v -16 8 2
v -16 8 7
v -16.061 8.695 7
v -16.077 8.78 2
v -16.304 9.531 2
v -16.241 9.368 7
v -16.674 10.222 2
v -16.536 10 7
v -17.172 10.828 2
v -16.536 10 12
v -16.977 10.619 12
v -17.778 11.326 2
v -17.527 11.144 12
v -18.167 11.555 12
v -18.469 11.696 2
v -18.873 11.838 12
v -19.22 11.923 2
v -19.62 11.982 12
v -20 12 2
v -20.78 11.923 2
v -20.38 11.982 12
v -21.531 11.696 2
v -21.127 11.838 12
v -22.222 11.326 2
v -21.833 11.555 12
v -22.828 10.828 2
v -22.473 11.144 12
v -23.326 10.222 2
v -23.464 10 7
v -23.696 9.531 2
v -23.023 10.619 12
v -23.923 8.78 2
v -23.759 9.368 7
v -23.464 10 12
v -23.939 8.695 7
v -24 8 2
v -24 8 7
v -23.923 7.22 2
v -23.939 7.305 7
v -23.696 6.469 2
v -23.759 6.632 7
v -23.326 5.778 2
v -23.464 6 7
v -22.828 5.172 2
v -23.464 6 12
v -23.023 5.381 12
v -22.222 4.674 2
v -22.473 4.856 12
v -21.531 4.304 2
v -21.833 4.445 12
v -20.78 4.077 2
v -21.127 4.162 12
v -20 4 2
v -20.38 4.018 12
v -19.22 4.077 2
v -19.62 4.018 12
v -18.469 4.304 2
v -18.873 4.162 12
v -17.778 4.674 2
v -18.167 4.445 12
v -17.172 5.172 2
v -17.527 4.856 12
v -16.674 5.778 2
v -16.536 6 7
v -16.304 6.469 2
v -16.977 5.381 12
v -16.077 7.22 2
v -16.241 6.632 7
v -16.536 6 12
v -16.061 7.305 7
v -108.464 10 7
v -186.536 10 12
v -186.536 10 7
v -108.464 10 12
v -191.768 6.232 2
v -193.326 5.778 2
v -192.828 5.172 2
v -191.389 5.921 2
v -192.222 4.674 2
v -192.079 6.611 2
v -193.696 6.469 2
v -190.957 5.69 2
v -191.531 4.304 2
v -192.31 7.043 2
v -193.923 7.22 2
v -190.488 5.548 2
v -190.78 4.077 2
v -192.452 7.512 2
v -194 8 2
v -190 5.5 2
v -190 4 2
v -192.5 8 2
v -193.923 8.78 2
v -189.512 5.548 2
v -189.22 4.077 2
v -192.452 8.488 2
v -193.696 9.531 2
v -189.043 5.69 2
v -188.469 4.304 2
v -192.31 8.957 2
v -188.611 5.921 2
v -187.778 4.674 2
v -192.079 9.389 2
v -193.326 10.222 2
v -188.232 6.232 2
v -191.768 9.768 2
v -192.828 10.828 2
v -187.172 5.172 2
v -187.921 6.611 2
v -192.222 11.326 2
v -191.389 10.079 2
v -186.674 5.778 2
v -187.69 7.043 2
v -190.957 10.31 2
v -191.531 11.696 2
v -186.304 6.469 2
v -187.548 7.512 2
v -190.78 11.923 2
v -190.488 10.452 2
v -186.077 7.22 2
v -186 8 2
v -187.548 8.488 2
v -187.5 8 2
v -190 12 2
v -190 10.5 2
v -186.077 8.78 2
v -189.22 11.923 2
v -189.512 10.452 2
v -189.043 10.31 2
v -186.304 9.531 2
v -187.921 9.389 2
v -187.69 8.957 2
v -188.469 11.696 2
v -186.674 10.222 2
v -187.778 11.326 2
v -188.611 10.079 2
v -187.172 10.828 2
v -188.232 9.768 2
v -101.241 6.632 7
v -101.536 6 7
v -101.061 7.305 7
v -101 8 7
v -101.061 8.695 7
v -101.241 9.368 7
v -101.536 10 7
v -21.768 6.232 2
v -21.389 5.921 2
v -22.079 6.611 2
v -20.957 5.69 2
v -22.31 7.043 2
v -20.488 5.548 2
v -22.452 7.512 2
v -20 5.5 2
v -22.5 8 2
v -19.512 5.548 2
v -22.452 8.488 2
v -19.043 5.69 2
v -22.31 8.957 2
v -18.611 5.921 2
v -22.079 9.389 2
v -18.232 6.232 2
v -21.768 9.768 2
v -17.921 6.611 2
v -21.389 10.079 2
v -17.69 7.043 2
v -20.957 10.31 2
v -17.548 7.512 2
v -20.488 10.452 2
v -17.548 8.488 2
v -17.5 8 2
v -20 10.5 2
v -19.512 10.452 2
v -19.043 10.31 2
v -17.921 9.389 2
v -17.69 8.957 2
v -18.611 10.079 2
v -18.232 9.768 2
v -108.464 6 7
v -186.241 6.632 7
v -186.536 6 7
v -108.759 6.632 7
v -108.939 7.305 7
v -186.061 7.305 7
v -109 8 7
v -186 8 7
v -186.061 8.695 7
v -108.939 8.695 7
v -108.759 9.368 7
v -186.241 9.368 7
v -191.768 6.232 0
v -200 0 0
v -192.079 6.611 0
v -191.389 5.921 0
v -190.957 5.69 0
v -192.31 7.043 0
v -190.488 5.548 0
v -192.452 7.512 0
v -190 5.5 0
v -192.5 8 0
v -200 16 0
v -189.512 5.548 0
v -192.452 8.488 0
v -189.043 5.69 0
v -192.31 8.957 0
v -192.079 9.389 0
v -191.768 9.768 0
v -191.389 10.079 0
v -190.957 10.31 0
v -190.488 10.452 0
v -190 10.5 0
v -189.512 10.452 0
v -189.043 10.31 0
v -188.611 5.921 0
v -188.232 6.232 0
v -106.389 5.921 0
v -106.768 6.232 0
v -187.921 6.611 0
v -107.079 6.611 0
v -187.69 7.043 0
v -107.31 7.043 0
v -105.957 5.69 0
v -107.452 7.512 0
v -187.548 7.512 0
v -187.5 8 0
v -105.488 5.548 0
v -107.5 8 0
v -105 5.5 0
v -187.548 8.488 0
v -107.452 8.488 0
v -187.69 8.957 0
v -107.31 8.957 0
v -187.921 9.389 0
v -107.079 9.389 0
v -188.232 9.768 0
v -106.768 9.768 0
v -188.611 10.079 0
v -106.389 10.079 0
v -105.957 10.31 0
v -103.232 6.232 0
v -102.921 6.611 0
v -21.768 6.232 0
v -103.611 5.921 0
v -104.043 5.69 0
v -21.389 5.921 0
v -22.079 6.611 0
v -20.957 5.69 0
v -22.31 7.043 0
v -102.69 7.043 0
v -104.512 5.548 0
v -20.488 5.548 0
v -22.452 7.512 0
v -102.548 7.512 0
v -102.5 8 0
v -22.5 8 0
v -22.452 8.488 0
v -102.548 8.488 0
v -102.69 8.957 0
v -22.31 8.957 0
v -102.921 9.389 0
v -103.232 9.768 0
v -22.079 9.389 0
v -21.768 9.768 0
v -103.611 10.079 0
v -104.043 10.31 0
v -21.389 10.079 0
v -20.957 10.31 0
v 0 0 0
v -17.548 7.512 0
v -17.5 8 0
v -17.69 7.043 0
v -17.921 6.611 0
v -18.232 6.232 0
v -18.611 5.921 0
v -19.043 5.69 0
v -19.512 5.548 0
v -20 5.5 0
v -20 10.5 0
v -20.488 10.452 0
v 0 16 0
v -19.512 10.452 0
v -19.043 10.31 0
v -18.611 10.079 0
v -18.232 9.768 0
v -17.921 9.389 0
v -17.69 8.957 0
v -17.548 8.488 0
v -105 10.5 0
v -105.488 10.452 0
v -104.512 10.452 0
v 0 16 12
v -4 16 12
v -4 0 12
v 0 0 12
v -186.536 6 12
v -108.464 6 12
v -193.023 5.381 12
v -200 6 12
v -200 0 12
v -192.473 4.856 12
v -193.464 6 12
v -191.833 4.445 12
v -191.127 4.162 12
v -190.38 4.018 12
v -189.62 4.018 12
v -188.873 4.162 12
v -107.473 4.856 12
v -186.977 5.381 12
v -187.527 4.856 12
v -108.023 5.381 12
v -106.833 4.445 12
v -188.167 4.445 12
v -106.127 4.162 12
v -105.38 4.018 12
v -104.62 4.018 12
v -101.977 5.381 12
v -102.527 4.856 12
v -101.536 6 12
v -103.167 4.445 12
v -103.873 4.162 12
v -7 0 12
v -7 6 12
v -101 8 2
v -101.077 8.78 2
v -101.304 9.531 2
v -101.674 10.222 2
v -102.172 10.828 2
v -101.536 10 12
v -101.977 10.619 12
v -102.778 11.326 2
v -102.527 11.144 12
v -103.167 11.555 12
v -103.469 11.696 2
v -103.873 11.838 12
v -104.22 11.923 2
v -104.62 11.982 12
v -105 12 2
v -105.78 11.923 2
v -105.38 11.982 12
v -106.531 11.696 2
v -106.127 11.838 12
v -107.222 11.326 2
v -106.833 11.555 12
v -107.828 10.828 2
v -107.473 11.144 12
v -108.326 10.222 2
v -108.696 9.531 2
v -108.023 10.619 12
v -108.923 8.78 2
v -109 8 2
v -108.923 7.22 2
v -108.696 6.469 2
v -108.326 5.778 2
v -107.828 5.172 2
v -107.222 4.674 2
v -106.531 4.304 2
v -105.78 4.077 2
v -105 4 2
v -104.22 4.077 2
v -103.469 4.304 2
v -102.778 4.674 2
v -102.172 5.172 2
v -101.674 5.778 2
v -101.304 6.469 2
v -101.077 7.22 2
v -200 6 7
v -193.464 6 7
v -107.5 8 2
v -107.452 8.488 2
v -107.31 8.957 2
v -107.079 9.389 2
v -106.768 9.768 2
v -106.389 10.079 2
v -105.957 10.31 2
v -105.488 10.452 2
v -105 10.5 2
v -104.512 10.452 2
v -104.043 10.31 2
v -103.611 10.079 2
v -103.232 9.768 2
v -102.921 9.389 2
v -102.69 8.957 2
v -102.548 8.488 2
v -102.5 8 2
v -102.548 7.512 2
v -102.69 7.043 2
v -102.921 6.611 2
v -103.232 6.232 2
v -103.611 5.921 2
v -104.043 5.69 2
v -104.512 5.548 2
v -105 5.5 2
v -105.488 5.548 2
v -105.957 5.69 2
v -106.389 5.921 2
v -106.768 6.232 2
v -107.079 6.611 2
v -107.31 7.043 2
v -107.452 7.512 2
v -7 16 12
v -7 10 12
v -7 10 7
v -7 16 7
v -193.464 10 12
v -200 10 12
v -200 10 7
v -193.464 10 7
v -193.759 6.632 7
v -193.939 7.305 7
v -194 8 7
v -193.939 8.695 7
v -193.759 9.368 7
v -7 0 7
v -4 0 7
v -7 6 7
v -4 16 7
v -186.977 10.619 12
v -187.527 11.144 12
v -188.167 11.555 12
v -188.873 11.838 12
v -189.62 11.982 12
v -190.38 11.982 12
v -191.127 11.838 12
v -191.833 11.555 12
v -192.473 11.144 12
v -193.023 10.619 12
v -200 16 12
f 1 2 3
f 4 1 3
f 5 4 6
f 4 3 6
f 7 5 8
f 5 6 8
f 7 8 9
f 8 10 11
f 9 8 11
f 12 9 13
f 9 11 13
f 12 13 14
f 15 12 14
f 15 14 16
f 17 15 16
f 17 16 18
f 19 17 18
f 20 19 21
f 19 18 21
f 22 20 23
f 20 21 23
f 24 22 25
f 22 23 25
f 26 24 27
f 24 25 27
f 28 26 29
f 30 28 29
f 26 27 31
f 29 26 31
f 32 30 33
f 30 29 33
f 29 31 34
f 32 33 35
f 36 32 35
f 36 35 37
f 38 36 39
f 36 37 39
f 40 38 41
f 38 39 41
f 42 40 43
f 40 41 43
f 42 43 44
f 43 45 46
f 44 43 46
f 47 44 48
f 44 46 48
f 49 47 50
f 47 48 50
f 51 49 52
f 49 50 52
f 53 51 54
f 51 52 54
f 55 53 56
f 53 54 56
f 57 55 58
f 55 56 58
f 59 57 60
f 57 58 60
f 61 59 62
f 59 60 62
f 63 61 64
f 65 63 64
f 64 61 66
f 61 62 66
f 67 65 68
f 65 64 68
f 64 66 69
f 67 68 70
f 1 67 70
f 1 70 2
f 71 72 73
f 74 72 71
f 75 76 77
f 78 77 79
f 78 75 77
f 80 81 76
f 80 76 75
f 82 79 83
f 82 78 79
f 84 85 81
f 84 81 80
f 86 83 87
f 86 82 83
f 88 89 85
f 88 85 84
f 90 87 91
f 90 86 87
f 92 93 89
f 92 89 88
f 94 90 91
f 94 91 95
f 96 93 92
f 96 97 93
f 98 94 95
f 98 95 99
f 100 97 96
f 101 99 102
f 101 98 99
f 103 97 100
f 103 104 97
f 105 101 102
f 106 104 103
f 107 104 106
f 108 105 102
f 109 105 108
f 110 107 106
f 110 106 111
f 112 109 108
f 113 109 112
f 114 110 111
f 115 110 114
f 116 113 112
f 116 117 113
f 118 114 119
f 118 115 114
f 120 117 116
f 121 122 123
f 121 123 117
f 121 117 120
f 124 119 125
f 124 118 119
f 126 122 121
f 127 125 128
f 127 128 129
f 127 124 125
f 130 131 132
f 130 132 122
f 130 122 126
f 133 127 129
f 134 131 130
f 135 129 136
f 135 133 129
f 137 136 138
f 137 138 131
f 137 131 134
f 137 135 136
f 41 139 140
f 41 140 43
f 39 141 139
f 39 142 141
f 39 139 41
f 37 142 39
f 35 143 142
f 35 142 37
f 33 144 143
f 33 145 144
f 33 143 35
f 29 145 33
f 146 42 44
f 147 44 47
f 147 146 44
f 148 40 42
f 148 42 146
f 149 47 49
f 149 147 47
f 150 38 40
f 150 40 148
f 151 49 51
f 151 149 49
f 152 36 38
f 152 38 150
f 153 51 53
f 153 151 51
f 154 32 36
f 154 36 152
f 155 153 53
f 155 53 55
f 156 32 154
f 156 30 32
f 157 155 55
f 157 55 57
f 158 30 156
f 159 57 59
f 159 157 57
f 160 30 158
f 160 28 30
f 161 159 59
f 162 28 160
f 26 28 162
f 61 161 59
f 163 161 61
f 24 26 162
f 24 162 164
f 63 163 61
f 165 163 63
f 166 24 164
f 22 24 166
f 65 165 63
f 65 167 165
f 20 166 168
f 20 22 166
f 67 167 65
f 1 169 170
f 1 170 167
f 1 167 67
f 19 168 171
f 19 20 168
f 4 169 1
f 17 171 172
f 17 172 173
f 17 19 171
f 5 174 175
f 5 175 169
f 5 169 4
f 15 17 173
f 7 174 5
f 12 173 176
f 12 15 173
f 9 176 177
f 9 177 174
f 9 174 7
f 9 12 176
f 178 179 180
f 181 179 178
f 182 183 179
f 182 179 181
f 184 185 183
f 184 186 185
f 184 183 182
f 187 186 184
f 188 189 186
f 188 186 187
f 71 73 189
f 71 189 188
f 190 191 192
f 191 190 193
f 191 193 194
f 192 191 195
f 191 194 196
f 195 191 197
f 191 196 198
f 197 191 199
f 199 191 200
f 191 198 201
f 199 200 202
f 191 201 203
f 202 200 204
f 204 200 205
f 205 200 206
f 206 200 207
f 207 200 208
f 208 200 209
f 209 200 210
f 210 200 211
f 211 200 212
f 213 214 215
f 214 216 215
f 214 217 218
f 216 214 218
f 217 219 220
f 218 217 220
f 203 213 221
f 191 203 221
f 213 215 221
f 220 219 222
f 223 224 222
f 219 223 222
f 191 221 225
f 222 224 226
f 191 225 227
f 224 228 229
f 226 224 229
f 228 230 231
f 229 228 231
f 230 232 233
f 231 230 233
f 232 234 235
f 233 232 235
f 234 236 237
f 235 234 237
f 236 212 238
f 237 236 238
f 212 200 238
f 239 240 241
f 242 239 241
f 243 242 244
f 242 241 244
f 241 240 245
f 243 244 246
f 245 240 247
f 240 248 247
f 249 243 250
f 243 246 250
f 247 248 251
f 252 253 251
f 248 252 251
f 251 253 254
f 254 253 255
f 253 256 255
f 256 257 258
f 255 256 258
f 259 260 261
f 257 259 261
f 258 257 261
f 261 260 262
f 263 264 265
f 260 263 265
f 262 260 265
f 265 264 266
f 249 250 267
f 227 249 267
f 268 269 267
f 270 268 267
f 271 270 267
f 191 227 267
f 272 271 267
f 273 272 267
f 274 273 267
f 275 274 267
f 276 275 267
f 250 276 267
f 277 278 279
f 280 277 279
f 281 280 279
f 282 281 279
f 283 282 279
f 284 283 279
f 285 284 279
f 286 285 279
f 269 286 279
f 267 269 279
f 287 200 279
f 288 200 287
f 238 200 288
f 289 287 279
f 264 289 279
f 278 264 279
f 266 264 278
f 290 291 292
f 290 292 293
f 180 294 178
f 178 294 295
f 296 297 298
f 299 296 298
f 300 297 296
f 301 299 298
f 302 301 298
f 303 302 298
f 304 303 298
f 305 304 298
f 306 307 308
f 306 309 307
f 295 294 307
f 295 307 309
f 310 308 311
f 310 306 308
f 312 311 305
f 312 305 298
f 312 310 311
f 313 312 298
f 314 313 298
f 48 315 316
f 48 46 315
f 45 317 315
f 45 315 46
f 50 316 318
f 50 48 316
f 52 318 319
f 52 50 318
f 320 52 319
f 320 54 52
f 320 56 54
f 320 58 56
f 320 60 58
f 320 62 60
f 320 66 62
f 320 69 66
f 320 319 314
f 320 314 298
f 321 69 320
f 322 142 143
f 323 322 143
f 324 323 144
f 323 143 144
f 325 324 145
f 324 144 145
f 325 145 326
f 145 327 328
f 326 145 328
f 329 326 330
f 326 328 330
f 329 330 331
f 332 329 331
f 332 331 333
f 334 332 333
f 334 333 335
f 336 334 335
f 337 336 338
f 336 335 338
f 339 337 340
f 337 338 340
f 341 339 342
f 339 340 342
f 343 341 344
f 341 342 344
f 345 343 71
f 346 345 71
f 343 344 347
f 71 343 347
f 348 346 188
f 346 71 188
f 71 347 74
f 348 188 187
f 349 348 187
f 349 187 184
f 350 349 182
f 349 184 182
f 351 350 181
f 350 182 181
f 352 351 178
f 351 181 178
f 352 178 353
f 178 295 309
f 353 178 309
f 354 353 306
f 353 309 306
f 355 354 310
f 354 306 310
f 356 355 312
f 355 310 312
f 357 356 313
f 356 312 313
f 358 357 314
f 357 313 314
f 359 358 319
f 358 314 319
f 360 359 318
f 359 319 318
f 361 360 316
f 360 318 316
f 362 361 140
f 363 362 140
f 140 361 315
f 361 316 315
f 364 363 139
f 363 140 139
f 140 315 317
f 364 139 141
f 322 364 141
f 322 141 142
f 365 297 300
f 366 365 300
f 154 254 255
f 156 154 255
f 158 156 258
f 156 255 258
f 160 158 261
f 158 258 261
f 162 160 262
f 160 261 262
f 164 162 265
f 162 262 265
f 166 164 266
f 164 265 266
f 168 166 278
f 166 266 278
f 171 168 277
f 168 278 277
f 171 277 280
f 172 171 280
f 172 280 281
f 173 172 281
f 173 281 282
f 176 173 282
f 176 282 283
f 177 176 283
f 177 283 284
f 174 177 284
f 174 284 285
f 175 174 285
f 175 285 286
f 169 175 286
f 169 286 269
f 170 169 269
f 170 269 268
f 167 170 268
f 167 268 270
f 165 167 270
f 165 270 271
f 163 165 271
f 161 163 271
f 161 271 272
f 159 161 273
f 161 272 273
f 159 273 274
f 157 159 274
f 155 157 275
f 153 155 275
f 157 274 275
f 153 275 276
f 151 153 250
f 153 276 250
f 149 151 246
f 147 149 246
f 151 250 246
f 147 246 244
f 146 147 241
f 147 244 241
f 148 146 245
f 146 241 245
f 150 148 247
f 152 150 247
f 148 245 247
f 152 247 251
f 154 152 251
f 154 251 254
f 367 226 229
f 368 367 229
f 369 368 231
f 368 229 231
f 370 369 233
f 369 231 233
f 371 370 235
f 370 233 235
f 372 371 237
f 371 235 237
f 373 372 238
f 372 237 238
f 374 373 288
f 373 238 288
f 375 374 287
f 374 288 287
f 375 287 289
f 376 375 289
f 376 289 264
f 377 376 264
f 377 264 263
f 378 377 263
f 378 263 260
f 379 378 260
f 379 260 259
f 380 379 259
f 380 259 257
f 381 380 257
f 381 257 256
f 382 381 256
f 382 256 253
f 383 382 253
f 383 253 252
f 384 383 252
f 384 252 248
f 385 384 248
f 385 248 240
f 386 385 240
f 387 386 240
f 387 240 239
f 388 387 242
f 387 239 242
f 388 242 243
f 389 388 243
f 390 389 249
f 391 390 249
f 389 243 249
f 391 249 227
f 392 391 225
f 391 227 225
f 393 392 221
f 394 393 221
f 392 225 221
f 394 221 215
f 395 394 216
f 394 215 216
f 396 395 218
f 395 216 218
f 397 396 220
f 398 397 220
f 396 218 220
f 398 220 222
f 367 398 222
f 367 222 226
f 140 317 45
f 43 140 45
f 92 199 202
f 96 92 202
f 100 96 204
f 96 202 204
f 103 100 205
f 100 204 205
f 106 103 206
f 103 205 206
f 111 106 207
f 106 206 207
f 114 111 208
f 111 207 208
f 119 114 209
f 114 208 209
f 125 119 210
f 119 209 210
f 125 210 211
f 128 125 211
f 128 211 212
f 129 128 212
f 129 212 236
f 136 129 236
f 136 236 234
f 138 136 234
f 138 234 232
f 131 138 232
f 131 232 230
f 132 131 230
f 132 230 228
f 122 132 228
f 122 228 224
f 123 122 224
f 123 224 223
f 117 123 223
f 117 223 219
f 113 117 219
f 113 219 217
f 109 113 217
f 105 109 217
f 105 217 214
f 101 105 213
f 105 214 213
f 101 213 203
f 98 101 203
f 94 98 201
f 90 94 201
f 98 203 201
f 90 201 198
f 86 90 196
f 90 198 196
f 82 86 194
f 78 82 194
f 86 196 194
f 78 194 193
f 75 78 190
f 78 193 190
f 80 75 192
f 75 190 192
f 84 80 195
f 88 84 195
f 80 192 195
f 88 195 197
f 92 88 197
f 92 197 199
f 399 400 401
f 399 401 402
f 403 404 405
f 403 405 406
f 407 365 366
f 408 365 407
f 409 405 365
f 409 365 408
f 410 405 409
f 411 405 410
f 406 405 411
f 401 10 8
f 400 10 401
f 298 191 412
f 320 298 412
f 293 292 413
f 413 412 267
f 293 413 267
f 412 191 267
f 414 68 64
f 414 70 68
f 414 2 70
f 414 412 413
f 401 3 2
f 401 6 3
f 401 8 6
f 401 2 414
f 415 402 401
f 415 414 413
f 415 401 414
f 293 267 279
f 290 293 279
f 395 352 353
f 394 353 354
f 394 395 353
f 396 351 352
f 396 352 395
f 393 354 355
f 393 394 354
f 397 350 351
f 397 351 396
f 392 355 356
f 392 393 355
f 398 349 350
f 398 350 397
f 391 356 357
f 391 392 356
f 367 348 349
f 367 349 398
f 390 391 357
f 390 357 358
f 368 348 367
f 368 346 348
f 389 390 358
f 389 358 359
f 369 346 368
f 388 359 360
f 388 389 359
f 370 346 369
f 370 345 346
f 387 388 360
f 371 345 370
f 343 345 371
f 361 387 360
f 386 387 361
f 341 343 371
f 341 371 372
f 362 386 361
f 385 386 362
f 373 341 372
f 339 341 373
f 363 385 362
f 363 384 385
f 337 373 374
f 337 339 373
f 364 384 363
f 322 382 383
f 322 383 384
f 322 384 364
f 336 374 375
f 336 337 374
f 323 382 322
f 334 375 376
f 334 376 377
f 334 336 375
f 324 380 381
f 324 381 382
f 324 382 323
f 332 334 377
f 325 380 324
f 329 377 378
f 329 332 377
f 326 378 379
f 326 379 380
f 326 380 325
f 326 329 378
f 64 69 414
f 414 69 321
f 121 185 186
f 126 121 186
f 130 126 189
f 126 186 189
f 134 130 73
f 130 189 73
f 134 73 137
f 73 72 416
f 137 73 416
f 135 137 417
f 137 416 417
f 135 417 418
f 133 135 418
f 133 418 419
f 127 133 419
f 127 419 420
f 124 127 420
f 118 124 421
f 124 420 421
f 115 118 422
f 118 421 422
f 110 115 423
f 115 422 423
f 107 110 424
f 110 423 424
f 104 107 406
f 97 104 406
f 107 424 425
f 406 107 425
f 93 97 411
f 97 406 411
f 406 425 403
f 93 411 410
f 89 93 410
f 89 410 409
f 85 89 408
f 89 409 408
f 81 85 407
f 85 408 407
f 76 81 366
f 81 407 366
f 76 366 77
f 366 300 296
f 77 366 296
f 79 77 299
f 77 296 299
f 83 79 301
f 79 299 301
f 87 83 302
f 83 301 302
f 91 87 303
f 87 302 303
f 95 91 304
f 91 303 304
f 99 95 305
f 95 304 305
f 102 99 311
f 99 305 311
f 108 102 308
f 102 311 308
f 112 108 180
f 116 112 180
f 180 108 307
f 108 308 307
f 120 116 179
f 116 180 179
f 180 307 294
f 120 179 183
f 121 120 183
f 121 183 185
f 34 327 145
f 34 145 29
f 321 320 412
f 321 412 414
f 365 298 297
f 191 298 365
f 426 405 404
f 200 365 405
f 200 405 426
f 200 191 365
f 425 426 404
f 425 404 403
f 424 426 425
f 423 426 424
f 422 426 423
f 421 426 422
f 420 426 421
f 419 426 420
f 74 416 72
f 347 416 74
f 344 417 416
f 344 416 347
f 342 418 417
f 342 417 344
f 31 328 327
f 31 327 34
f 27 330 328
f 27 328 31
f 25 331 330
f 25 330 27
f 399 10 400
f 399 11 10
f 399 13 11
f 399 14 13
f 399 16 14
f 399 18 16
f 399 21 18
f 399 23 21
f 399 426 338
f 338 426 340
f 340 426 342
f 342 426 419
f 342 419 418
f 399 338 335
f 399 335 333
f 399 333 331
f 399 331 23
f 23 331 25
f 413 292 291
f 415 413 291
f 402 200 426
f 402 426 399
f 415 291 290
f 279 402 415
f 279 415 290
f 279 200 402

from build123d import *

# Parameters (mm, degrees)
F0_W     = 200
F0_H     = 16
F1_DEPTH = 12
F2_W     = 196
F2_H     = 4
F3_DEPTH = 5
F4_R     = 4
F5_DEPTH = 10
F7_D     = 5
F8_W     = 3
F8_H     = 6
F9_DEPTH = 5


with BuildPart() as f1:
    # F0 (on Top) → F1 (new body)
    with BuildSketch(Plane.XY):
        with Locations((-100, 8)):
            Rectangle(F0_W, F0_H)
    extrude(amount=F1_DEPTH)

    # F2 (on face) → F3 (cut)
    with BuildSketch(Plane.XY.offset(12)):
        with Locations((-102, 8)):
            Rectangle(F2_W, F2_H)
    extrude(amount=-F3_DEPTH, mode=Mode.SUBTRACT)

    # F4 (on face) → F5 (cut)
    with BuildSketch(Plane.XY.offset(12)):
        with Locations((-190, 8)):
            Circle(F4_R)
        with Locations((-105, 8)):
            Circle(F4_R)
        with Locations((-20, 8)):
            Circle(F4_R)
    extrude(amount=-F5_DEPTH, mode=Mode.SUBTRACT)

    # F7 (through all)
    with Locations(Plane.XY.offset(12)):
        with Locations((-105, 8), (-190, 8), (-20, 8)):
            Hole(F7_D / 2)

    # F8 (on face) → F9 (cut)
    with BuildSketch(Plane.XY.offset(12)):
        with Locations((-5.5, 13)):
            Rectangle(F8_W, F8_H)
        with Locations((-5.5, 3)):
            Rectangle(F8_W, F8_H)
    extrude(amount=-F9_DEPTH, mode=Mode.SUBTRACT)


solid = f1.part
